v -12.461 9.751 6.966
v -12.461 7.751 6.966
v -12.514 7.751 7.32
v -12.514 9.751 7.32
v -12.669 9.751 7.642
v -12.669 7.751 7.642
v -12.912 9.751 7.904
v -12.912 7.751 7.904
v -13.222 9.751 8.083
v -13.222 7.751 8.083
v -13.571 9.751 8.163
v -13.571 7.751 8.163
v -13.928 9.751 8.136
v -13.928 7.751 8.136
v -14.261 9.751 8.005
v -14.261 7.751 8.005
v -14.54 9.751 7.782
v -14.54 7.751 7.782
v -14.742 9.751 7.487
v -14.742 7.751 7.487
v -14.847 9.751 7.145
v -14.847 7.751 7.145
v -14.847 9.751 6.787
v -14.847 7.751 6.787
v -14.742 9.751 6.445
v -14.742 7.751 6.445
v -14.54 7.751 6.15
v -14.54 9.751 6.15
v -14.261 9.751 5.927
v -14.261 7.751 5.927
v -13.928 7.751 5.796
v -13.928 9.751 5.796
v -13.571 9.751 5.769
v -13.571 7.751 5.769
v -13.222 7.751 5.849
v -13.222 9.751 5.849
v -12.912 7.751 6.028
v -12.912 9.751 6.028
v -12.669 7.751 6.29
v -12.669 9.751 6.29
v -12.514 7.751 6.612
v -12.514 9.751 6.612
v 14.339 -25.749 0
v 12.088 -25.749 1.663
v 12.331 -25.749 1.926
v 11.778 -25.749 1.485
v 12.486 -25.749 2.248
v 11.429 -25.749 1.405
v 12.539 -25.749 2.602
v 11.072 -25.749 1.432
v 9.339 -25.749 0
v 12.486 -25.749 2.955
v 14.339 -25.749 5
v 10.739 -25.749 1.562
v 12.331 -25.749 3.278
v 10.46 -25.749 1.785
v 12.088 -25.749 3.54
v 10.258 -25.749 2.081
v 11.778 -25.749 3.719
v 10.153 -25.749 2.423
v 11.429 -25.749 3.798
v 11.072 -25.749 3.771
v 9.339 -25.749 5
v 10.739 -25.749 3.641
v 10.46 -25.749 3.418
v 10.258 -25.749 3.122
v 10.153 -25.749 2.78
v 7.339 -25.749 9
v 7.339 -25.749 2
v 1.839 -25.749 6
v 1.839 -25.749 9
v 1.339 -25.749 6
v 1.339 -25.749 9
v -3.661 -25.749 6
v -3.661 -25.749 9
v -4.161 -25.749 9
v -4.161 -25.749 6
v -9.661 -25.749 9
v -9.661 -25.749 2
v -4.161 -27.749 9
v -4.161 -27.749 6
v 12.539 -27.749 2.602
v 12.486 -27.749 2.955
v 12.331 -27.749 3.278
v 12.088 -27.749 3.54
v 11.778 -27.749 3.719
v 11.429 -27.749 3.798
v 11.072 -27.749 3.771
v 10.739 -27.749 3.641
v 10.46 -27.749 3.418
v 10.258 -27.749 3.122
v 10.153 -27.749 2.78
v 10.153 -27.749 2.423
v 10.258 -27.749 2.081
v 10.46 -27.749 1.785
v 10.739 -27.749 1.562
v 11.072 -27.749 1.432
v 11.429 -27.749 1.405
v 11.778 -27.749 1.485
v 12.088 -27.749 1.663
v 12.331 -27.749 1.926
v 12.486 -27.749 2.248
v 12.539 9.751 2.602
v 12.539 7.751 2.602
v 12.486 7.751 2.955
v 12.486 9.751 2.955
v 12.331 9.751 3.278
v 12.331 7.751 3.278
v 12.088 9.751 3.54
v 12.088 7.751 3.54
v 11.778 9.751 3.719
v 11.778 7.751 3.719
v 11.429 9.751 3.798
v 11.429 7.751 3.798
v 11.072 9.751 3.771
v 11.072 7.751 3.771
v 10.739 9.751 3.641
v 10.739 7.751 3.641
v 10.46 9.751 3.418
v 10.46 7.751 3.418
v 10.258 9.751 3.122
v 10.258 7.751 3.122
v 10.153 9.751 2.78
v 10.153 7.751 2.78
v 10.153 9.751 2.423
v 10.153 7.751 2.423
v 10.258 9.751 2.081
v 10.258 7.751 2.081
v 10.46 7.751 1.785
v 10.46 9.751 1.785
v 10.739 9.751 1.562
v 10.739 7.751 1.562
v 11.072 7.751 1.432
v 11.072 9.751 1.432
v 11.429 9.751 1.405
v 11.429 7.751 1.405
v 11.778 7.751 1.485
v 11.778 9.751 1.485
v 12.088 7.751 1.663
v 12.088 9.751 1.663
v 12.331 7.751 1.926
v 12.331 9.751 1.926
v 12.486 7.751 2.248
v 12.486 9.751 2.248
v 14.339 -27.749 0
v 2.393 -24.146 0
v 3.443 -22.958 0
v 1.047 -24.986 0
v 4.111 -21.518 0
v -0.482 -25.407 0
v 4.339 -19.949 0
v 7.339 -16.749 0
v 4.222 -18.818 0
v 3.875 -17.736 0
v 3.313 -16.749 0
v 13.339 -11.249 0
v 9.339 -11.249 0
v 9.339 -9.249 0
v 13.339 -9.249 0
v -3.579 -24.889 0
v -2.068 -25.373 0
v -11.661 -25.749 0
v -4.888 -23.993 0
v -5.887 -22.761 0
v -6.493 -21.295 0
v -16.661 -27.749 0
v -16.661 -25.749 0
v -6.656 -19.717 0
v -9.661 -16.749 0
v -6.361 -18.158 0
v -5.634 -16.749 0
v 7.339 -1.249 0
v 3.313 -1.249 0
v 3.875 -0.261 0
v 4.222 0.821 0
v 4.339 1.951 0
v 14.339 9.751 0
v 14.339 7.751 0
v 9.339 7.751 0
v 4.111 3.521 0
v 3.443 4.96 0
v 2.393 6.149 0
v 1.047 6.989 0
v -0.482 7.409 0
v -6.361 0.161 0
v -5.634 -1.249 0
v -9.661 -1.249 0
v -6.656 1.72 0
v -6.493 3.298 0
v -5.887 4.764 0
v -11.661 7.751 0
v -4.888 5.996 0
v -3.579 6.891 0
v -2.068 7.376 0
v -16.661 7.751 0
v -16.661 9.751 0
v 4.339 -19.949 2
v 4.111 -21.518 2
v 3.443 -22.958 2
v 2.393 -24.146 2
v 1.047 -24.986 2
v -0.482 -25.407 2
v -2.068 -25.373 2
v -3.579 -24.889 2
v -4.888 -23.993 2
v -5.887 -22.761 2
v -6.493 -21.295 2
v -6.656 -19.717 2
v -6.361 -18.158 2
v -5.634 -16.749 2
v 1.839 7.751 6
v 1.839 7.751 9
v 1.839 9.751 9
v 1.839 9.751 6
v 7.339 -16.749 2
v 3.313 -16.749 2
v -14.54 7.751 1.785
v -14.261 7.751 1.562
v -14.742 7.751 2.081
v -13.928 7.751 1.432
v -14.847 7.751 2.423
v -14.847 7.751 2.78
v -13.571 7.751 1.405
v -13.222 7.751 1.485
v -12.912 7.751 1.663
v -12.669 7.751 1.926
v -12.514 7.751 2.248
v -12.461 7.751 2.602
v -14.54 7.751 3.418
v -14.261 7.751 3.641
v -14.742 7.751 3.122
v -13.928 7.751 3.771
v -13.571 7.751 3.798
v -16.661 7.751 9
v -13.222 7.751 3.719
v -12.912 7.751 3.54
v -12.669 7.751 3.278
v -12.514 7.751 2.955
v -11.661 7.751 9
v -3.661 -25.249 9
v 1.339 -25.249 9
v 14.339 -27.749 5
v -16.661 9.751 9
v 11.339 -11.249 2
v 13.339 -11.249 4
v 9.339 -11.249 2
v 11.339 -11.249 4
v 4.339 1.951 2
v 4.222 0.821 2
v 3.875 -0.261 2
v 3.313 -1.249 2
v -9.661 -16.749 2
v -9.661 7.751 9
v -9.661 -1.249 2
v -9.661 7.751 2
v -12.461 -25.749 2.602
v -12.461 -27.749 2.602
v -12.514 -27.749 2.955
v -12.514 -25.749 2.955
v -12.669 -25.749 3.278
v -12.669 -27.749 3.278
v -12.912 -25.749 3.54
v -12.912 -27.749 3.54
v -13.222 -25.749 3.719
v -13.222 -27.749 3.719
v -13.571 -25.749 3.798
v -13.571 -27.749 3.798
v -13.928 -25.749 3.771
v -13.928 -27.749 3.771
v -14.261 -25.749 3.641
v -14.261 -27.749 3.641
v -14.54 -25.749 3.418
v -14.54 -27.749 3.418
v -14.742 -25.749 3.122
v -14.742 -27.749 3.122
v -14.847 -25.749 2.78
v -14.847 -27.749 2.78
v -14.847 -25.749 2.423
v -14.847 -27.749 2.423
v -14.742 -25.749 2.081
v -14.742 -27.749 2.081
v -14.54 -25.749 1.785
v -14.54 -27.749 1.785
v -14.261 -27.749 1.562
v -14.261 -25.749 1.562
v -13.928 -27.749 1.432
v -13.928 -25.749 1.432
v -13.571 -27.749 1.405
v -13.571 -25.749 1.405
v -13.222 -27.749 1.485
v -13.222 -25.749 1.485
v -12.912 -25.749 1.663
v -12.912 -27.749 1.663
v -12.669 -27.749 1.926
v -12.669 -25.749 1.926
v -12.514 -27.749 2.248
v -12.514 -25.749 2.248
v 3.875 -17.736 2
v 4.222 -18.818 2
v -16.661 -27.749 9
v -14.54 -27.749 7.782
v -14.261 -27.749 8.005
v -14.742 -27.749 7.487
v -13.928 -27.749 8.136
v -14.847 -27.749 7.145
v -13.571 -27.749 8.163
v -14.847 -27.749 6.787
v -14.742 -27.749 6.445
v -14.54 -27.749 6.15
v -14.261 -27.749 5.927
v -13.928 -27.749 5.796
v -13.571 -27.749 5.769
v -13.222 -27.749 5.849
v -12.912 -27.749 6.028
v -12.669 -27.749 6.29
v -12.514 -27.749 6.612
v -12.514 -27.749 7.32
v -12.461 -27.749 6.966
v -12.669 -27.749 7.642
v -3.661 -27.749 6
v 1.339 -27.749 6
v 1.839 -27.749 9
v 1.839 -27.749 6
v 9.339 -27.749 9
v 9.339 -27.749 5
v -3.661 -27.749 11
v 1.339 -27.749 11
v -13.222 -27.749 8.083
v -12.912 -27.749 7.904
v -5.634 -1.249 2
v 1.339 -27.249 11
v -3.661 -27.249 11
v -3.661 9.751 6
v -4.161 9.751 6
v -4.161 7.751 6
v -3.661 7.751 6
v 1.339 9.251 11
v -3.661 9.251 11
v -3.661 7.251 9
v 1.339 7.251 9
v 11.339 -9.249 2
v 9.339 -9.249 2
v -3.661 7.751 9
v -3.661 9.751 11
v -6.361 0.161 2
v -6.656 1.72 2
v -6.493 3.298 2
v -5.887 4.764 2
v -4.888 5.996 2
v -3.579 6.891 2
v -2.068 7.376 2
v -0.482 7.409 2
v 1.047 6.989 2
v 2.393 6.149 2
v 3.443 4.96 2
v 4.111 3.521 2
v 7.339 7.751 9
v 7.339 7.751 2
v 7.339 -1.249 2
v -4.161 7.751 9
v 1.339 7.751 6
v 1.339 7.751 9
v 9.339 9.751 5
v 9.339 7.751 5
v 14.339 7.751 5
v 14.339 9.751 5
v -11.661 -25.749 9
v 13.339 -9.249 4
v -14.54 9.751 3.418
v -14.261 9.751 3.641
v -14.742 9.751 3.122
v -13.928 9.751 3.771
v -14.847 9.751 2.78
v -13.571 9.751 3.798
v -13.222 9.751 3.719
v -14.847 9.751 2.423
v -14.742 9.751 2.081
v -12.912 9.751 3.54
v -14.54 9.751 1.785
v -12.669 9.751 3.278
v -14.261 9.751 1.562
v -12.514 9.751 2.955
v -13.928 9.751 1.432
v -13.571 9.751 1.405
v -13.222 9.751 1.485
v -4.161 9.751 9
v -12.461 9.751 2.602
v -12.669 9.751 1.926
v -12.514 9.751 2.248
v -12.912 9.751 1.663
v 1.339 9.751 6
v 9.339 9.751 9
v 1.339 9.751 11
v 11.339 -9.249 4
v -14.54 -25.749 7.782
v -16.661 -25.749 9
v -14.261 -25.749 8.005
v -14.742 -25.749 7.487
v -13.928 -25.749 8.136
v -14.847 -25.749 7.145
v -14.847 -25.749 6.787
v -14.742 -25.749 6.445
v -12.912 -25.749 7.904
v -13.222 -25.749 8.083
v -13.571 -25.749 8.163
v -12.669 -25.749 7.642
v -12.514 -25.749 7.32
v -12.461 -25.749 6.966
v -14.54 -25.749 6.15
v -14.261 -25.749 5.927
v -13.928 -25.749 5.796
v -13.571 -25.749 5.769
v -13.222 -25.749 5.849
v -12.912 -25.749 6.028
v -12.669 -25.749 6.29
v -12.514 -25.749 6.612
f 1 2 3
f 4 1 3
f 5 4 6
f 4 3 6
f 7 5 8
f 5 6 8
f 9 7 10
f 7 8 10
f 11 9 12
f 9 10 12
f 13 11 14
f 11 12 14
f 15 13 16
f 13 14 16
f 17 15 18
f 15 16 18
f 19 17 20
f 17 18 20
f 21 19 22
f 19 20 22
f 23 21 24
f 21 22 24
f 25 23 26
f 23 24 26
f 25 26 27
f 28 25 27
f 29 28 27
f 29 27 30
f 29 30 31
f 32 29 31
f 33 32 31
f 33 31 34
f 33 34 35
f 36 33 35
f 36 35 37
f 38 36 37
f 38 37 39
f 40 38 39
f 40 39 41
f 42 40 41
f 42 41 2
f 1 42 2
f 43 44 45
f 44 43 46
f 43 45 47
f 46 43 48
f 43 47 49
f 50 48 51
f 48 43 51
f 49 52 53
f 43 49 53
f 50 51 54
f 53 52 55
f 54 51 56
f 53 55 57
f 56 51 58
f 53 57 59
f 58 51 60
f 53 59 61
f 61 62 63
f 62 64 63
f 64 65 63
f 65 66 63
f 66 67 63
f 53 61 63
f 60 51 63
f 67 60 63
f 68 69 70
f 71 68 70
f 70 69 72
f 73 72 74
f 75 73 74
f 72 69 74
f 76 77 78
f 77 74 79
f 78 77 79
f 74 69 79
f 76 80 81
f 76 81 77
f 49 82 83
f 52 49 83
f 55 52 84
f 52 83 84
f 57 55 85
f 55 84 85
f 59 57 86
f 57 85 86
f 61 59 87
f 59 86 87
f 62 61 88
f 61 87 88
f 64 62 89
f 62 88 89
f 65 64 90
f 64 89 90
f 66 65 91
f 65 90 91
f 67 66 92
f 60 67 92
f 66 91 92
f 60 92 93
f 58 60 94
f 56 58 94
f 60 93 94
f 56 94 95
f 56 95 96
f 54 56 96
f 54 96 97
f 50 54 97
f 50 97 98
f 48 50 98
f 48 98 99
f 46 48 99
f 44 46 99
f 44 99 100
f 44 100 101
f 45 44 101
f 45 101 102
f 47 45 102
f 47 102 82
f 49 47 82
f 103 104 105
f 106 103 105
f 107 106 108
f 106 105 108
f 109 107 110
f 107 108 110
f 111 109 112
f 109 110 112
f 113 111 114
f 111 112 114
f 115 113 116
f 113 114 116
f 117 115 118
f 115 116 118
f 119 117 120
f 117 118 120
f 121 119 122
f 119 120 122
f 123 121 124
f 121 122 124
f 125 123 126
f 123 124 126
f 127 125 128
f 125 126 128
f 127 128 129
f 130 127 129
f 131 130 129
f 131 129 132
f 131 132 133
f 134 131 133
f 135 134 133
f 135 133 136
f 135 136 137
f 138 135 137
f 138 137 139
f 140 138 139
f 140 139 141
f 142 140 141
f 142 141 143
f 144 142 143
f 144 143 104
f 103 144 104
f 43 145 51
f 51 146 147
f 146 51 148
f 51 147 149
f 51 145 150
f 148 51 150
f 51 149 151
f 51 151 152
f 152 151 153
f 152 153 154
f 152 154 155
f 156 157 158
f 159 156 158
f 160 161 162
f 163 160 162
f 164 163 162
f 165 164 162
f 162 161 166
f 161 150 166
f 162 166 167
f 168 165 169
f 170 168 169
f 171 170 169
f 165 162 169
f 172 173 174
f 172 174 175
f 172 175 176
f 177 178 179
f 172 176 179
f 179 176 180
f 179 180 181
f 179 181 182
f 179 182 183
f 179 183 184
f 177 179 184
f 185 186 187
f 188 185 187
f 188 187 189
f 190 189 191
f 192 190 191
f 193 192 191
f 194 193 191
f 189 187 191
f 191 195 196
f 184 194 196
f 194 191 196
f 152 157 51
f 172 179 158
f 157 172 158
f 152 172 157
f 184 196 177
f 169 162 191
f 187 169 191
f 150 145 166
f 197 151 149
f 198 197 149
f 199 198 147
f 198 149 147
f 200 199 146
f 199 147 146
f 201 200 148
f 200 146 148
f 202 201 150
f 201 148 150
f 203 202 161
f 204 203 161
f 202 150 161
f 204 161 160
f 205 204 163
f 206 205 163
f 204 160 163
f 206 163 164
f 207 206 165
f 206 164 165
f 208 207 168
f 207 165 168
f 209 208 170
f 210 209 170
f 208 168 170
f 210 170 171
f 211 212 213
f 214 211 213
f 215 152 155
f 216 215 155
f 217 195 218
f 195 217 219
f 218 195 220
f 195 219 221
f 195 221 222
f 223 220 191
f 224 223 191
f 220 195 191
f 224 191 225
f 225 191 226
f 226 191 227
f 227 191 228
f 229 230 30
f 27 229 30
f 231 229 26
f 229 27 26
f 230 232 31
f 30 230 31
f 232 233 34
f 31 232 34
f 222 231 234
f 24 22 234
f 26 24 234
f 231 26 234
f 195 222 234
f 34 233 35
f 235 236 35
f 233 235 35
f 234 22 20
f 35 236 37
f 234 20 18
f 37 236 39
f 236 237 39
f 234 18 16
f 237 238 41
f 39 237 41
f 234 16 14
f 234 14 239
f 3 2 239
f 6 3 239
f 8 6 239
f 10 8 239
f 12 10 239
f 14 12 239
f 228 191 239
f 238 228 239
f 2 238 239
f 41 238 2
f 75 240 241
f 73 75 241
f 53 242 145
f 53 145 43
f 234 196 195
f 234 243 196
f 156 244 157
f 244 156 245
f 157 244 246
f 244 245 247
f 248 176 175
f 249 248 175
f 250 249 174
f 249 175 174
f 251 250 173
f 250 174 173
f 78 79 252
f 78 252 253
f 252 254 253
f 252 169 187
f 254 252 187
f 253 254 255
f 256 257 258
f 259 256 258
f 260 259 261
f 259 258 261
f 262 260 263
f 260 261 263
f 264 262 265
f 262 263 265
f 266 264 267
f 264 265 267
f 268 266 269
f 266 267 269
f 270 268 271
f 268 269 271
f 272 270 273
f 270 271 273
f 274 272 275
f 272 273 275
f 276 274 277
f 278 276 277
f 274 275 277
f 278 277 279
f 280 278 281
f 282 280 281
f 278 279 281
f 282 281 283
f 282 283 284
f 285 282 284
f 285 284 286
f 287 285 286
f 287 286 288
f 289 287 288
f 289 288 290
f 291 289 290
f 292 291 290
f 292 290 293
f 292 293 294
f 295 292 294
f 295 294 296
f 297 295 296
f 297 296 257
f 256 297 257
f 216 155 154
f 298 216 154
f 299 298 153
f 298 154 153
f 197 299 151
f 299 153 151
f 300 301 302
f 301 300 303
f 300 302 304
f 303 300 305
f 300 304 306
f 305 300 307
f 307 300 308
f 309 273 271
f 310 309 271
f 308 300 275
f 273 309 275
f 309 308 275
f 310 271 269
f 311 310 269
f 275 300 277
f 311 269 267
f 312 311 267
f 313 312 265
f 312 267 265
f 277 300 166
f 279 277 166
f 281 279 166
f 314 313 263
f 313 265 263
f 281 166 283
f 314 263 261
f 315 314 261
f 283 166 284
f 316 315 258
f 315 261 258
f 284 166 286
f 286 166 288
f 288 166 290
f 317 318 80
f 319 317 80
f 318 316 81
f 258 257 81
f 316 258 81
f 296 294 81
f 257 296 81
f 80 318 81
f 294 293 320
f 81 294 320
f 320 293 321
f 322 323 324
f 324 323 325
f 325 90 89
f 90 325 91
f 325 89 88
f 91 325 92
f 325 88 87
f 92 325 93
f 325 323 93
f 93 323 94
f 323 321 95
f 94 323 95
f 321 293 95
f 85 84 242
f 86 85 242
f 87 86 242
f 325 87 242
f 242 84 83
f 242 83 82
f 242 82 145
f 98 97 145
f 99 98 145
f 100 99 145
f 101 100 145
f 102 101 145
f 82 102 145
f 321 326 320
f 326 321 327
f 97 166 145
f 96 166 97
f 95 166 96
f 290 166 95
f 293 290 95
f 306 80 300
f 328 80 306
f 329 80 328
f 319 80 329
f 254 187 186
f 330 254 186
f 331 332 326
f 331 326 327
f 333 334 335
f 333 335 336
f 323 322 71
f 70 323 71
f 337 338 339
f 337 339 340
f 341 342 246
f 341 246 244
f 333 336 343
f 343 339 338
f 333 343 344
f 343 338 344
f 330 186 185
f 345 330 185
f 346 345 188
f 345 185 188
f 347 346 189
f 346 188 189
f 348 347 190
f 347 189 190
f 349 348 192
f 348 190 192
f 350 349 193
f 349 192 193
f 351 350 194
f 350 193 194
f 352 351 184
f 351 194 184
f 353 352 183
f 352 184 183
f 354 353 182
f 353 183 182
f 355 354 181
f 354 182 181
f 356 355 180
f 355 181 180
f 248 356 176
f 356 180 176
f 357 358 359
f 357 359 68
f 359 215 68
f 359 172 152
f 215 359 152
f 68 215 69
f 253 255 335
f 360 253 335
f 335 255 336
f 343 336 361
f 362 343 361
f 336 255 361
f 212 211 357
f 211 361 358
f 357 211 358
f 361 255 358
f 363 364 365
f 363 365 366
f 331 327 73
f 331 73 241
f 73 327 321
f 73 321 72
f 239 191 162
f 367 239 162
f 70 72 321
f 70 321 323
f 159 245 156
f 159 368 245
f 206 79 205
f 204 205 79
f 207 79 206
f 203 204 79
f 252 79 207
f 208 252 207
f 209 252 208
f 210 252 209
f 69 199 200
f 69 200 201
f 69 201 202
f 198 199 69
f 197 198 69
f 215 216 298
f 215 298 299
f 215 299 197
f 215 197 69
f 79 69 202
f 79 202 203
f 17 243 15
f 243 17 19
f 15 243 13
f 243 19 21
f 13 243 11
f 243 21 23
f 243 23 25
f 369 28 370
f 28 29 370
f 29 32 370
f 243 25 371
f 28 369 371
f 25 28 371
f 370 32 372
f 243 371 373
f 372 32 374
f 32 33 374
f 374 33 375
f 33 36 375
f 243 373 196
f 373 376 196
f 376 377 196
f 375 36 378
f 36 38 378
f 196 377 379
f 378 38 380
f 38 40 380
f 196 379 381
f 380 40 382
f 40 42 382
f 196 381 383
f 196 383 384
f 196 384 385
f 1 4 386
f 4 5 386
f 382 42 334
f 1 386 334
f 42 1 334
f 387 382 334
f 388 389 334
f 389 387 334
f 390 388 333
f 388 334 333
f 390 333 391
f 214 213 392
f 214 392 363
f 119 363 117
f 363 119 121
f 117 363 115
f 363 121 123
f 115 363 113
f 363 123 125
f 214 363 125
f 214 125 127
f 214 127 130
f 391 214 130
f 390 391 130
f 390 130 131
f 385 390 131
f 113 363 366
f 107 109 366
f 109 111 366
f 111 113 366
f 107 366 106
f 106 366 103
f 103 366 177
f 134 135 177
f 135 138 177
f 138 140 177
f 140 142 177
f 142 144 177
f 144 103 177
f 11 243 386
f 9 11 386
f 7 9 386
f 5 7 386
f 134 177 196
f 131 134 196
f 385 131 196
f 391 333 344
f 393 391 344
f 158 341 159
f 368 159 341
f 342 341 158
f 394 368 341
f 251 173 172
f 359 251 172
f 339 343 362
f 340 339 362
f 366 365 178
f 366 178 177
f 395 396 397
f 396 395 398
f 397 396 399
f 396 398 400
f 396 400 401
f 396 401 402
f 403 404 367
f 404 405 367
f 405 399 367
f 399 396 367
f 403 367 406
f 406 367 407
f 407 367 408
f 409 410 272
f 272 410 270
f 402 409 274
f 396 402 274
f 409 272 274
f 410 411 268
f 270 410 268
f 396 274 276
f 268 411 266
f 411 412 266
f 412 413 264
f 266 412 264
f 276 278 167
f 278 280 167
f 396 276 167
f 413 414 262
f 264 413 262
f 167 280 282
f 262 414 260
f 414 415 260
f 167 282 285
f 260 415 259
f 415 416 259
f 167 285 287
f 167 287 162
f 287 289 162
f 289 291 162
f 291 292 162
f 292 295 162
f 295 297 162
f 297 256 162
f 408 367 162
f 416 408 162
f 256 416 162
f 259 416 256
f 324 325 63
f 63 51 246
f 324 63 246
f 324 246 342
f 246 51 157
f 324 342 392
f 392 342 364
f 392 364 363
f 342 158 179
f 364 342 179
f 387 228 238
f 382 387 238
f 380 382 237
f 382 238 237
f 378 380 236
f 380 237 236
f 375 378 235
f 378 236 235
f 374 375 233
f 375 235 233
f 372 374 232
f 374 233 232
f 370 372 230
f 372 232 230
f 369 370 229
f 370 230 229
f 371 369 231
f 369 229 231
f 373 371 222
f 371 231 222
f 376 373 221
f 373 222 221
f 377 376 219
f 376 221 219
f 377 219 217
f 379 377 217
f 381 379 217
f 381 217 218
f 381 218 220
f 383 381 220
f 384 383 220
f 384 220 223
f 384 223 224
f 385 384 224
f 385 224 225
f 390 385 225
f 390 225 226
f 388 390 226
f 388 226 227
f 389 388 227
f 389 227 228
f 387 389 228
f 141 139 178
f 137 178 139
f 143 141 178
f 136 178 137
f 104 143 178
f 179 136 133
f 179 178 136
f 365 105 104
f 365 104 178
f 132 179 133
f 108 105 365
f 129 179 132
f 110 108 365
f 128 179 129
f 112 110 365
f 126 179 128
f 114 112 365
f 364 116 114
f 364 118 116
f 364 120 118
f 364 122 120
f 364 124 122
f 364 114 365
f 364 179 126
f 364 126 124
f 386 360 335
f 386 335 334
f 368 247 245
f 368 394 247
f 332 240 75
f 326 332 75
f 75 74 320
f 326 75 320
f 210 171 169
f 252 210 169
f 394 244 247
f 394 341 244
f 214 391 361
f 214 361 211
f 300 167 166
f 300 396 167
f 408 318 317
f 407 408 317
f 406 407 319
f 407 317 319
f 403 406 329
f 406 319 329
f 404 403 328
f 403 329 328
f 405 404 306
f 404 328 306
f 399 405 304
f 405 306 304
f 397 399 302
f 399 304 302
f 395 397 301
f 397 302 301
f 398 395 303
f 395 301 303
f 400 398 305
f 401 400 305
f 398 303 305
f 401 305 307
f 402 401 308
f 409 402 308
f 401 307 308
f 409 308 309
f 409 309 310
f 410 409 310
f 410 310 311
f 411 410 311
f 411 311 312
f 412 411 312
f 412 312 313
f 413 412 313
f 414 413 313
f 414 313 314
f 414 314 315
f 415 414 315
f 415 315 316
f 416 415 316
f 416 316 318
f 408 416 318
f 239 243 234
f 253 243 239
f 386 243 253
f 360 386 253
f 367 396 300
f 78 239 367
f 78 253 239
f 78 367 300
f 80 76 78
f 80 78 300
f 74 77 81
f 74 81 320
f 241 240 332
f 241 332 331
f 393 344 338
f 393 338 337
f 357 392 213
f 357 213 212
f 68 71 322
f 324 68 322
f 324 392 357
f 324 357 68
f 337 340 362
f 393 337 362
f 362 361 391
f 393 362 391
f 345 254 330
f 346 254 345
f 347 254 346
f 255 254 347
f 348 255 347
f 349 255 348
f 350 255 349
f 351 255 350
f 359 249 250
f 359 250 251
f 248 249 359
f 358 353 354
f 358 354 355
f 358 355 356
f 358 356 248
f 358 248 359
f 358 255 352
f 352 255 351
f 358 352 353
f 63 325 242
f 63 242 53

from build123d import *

# Parameters (mm, degrees)
F1_DEPTH  = 2
F2_DEPTH  = 9
F3_W      = 2
F3_H      = 5
F3_H_2    = 4
F4_DEPTH  = 5
F5_W      = 2
F5_H      = 5
F6_DEPTH  = 5
F7_R      = 1.2
F8_DEPTH  = 40
F11_DEPTH = 1
F12_W     = 5
F12_H     = 2
F12_H_2   = 0.5
F13_DEPTH = 2
F14_SIZE  = 1.99999
F12_W_2   = 0.5
F15_DEPTH = 3


# Not quite as in the source:
# - a fillet or chamfer is up to 0.001 mm smaller than in the source, because OpenCascade refuses the exact size


with BuildPart() as f1:
    # F0 (on Top) → F1 (new body)
    with BuildSketch(Plane.XY):
        Polygon((-5.1606558692, 9.7513413054), (-11.6606558692, 9.7513413054), (-11.6606558692, -27.7486586946), (-5.1606558692, -27.7486586946), (2.8393441308, -27.7486586946), (9.3393441308, -27.7486586946), (9.3393441308, 9.7513413054), (2.8393441308, 9.7513413054), align=None)
        Polygon((-9.6606558692, -1.2486586946), (-9.6606558692, 7.7513413054), (7.3393441308, 7.7513413054), (7.3393441308, -1.2486586946), (7.3393441308, -16.7486586946), (7.3393441308, -25.7486586946), (-9.6606558692, -25.7486586946), (-9.6606558692, -16.7486586946), align=None, mode=Mode.SUBTRACT)
        with BuildLine():
            Line((7.3393441308, 7.7513413054), (-9.6606558692, 7.7513413054))
            Line((-9.6606558692, 7.7513413054), (-9.6606558692, -1.2486586946))
            Line((-9.6606558692, -1.2486586946), (-5.6339097184, -1.2486586946))
            ThreePointArc((-5.6339097184, -1.2486586946), (-2.8409986659, 7.1883679509), (4.3393441308, 1.9513413054))
            ThreePointArc((4.3393441308, 1.9513413054), (4.0763707763, 0.2709985087), (3.3125979801, -1.2486586946))
            Line((3.3125979801, -1.2486586946), (7.3393441308, -1.2486586946))
            Line((7.3393441308, -1.2486586946), (7.3393441308, 7.7513413054))
        make_face()
        with BuildLine():
            Line((-5.6339097184, -16.7486586946), (-9.6606558692, -16.7486586946))
            Line((-9.6606558692, -16.7486586946), (-9.6606558692, -25.7486586946))
            Line((-9.6606558692, -25.7486586946), (7.3393441308, -25.7486586946))
            Line((7.3393441308, -25.7486586946), (7.3393441308, -16.7486586946))
            Line((7.3393441308, -16.7486586946), (3.3125979801, -16.7486586946))
            ThreePointArc((3.3125979801, -16.7486586946), (4.0763707763, -18.2683158979), (4.3393441308, -19.9486586946))
            ThreePointArc((4.3393441308, -19.9486586946), (-2.8409986659, -25.1856853401), (-5.6339097184, -16.7486586946))
        make_face()
    extrude(amount=F1_DEPTH)

    # F0 (on Top) → F2 (join)
    with BuildSketch(Plane.XY):
        Polygon((-5.1606558692, 9.7513413054), (-11.6606558692, 9.7513413054), (-11.6606558692, -27.7486586946), (-5.1606558692, -27.7486586946), (2.8393441308, -27.7486586946), (9.3393441308, -27.7486586946), (9.3393441308, 9.7513413054), (2.8393441308, 9.7513413054), align=None)
        Polygon((-9.6606558692, -1.2486586946), (-9.6606558692, 7.7513413054), (7.3393441308, 7.7513413054), (7.3393441308, -1.2486586946), (7.3393441308, -16.7486586946), (7.3393441308, -25.7486586946), (-9.6606558692, -25.7486586946), (-9.6606558692, -16.7486586946), align=None, mode=Mode.SUBTRACT)
    extrude(amount=F2_DEPTH)

    # F3 (on face) → F4 (join)
    with BuildSketch(Plane(origin=(-11.6606558692, 0, 0), x_dir=(0, -1, 0), z_dir=(-1, 0, 0))):
        with Locations((-8.7513413054, 2.5)):
            Rectangle(F3_W, F3_H)
        with Locations((-8.7513413054, 7)):
            Rectangle(F3_W, F3_H_2)
        with Locations((26.7486586946, 2.5)):
            Rectangle(F3_W, F3_H)
        with Locations((26.7486586946, 7)):
            Rectangle(F3_W, F3_H_2)
    extrude(amount=F4_DEPTH)

    # F5 (on face) → F6 (join)
    with BuildSketch(Plane.YZ.offset(9.3393441308)):
        with Locations((-26.7486586946, 2.5)):
            Rectangle(F5_W, F5_H)
        with Locations((8.7513413054, 2.5)):
            Rectangle(F5_W, F5_H)
    extrude(amount=F6_DEPTH)

    # F7 (on face) → F8 (cut)
    with BuildSketch(Plane.XZ.offset(27.7486586946)):
        with Locations((-13.6606558692, 2.6015837211)):
            Circle(F7_R)
        with Locations((11.3393441308, 2.6015837211)):
            Circle(F7_R)
        with Locations((-13.6606558692, 6.9661107846)):
            Circle(F7_R)
    extrude(amount=-F8_DEPTH, mode=Mode.SUBTRACT)

    # F10 (on offset) → F11 (join, symmetric)
    with BuildSketch(Plane(origin=(0, -10.2486586946, 0), x_dir=(-1, 0, 0), z_dir=(0, 1, 0))):
        Polygon((-13.3393441308, 4), (-13.3393441308, 0), (-9.3393441308, 0), (-9.3393441308, 2), (-11.3393441308, 2), (-11.3393441308, 4), align=None)
    extrude(amount=F11_DEPTH, both=True)

    # F12 (on face) → F13 (join)
    with BuildSketch(Plane.XY.offset(9)):
        with Locations((-1.1606558692, -26.7486586946)):
            Rectangle(F12_W, F12_H)
        with Locations((-1.1606558692, -25.4986586946)):
            Rectangle(F12_W, F12_H_2)
        with Locations((-1.1606558692, 8.7513413054)):
            Rectangle(F12_W, F12_H)
        with Locations((-1.1606558692, 7.5013413054)):
            Rectangle(F12_W, F12_H_2)
    extrude(amount=F13_DEPTH)

    # F14 (size 2 in the source; OpenCascade refuses exactly that, so slightly less here)
    f14_edges = [f1.edges().sort_by_distance(p)[0] for p in [
        (-1.160656, -25.248659, 11),
        (-1.160656, 7.251341, 11),
    ]]
    chamfer(f14_edges, length=F14_SIZE)

    # F12 (on face) → F15 (cut)
    with BuildSketch(Plane.XY.offset(9)):
        with Locations((-3.9106558692, -26.7486586946)):
            Rectangle(F12_W_2, F12_H)
        with Locations((1.5893441308, -26.7486586946)):
            Rectangle(F12_W_2, F12_H)
        with Locations((1.5893441308, 8.7513413054)):
            Rectangle(F12_W_2, F12_H)
        with Locations((-3.9106558692, 8.7513413054)):
            Rectangle(F12_W_2, F12_H)
    extrude(amount=-F15_DEPTH, mode=Mode.SUBTRACT)


solid = f1.part
